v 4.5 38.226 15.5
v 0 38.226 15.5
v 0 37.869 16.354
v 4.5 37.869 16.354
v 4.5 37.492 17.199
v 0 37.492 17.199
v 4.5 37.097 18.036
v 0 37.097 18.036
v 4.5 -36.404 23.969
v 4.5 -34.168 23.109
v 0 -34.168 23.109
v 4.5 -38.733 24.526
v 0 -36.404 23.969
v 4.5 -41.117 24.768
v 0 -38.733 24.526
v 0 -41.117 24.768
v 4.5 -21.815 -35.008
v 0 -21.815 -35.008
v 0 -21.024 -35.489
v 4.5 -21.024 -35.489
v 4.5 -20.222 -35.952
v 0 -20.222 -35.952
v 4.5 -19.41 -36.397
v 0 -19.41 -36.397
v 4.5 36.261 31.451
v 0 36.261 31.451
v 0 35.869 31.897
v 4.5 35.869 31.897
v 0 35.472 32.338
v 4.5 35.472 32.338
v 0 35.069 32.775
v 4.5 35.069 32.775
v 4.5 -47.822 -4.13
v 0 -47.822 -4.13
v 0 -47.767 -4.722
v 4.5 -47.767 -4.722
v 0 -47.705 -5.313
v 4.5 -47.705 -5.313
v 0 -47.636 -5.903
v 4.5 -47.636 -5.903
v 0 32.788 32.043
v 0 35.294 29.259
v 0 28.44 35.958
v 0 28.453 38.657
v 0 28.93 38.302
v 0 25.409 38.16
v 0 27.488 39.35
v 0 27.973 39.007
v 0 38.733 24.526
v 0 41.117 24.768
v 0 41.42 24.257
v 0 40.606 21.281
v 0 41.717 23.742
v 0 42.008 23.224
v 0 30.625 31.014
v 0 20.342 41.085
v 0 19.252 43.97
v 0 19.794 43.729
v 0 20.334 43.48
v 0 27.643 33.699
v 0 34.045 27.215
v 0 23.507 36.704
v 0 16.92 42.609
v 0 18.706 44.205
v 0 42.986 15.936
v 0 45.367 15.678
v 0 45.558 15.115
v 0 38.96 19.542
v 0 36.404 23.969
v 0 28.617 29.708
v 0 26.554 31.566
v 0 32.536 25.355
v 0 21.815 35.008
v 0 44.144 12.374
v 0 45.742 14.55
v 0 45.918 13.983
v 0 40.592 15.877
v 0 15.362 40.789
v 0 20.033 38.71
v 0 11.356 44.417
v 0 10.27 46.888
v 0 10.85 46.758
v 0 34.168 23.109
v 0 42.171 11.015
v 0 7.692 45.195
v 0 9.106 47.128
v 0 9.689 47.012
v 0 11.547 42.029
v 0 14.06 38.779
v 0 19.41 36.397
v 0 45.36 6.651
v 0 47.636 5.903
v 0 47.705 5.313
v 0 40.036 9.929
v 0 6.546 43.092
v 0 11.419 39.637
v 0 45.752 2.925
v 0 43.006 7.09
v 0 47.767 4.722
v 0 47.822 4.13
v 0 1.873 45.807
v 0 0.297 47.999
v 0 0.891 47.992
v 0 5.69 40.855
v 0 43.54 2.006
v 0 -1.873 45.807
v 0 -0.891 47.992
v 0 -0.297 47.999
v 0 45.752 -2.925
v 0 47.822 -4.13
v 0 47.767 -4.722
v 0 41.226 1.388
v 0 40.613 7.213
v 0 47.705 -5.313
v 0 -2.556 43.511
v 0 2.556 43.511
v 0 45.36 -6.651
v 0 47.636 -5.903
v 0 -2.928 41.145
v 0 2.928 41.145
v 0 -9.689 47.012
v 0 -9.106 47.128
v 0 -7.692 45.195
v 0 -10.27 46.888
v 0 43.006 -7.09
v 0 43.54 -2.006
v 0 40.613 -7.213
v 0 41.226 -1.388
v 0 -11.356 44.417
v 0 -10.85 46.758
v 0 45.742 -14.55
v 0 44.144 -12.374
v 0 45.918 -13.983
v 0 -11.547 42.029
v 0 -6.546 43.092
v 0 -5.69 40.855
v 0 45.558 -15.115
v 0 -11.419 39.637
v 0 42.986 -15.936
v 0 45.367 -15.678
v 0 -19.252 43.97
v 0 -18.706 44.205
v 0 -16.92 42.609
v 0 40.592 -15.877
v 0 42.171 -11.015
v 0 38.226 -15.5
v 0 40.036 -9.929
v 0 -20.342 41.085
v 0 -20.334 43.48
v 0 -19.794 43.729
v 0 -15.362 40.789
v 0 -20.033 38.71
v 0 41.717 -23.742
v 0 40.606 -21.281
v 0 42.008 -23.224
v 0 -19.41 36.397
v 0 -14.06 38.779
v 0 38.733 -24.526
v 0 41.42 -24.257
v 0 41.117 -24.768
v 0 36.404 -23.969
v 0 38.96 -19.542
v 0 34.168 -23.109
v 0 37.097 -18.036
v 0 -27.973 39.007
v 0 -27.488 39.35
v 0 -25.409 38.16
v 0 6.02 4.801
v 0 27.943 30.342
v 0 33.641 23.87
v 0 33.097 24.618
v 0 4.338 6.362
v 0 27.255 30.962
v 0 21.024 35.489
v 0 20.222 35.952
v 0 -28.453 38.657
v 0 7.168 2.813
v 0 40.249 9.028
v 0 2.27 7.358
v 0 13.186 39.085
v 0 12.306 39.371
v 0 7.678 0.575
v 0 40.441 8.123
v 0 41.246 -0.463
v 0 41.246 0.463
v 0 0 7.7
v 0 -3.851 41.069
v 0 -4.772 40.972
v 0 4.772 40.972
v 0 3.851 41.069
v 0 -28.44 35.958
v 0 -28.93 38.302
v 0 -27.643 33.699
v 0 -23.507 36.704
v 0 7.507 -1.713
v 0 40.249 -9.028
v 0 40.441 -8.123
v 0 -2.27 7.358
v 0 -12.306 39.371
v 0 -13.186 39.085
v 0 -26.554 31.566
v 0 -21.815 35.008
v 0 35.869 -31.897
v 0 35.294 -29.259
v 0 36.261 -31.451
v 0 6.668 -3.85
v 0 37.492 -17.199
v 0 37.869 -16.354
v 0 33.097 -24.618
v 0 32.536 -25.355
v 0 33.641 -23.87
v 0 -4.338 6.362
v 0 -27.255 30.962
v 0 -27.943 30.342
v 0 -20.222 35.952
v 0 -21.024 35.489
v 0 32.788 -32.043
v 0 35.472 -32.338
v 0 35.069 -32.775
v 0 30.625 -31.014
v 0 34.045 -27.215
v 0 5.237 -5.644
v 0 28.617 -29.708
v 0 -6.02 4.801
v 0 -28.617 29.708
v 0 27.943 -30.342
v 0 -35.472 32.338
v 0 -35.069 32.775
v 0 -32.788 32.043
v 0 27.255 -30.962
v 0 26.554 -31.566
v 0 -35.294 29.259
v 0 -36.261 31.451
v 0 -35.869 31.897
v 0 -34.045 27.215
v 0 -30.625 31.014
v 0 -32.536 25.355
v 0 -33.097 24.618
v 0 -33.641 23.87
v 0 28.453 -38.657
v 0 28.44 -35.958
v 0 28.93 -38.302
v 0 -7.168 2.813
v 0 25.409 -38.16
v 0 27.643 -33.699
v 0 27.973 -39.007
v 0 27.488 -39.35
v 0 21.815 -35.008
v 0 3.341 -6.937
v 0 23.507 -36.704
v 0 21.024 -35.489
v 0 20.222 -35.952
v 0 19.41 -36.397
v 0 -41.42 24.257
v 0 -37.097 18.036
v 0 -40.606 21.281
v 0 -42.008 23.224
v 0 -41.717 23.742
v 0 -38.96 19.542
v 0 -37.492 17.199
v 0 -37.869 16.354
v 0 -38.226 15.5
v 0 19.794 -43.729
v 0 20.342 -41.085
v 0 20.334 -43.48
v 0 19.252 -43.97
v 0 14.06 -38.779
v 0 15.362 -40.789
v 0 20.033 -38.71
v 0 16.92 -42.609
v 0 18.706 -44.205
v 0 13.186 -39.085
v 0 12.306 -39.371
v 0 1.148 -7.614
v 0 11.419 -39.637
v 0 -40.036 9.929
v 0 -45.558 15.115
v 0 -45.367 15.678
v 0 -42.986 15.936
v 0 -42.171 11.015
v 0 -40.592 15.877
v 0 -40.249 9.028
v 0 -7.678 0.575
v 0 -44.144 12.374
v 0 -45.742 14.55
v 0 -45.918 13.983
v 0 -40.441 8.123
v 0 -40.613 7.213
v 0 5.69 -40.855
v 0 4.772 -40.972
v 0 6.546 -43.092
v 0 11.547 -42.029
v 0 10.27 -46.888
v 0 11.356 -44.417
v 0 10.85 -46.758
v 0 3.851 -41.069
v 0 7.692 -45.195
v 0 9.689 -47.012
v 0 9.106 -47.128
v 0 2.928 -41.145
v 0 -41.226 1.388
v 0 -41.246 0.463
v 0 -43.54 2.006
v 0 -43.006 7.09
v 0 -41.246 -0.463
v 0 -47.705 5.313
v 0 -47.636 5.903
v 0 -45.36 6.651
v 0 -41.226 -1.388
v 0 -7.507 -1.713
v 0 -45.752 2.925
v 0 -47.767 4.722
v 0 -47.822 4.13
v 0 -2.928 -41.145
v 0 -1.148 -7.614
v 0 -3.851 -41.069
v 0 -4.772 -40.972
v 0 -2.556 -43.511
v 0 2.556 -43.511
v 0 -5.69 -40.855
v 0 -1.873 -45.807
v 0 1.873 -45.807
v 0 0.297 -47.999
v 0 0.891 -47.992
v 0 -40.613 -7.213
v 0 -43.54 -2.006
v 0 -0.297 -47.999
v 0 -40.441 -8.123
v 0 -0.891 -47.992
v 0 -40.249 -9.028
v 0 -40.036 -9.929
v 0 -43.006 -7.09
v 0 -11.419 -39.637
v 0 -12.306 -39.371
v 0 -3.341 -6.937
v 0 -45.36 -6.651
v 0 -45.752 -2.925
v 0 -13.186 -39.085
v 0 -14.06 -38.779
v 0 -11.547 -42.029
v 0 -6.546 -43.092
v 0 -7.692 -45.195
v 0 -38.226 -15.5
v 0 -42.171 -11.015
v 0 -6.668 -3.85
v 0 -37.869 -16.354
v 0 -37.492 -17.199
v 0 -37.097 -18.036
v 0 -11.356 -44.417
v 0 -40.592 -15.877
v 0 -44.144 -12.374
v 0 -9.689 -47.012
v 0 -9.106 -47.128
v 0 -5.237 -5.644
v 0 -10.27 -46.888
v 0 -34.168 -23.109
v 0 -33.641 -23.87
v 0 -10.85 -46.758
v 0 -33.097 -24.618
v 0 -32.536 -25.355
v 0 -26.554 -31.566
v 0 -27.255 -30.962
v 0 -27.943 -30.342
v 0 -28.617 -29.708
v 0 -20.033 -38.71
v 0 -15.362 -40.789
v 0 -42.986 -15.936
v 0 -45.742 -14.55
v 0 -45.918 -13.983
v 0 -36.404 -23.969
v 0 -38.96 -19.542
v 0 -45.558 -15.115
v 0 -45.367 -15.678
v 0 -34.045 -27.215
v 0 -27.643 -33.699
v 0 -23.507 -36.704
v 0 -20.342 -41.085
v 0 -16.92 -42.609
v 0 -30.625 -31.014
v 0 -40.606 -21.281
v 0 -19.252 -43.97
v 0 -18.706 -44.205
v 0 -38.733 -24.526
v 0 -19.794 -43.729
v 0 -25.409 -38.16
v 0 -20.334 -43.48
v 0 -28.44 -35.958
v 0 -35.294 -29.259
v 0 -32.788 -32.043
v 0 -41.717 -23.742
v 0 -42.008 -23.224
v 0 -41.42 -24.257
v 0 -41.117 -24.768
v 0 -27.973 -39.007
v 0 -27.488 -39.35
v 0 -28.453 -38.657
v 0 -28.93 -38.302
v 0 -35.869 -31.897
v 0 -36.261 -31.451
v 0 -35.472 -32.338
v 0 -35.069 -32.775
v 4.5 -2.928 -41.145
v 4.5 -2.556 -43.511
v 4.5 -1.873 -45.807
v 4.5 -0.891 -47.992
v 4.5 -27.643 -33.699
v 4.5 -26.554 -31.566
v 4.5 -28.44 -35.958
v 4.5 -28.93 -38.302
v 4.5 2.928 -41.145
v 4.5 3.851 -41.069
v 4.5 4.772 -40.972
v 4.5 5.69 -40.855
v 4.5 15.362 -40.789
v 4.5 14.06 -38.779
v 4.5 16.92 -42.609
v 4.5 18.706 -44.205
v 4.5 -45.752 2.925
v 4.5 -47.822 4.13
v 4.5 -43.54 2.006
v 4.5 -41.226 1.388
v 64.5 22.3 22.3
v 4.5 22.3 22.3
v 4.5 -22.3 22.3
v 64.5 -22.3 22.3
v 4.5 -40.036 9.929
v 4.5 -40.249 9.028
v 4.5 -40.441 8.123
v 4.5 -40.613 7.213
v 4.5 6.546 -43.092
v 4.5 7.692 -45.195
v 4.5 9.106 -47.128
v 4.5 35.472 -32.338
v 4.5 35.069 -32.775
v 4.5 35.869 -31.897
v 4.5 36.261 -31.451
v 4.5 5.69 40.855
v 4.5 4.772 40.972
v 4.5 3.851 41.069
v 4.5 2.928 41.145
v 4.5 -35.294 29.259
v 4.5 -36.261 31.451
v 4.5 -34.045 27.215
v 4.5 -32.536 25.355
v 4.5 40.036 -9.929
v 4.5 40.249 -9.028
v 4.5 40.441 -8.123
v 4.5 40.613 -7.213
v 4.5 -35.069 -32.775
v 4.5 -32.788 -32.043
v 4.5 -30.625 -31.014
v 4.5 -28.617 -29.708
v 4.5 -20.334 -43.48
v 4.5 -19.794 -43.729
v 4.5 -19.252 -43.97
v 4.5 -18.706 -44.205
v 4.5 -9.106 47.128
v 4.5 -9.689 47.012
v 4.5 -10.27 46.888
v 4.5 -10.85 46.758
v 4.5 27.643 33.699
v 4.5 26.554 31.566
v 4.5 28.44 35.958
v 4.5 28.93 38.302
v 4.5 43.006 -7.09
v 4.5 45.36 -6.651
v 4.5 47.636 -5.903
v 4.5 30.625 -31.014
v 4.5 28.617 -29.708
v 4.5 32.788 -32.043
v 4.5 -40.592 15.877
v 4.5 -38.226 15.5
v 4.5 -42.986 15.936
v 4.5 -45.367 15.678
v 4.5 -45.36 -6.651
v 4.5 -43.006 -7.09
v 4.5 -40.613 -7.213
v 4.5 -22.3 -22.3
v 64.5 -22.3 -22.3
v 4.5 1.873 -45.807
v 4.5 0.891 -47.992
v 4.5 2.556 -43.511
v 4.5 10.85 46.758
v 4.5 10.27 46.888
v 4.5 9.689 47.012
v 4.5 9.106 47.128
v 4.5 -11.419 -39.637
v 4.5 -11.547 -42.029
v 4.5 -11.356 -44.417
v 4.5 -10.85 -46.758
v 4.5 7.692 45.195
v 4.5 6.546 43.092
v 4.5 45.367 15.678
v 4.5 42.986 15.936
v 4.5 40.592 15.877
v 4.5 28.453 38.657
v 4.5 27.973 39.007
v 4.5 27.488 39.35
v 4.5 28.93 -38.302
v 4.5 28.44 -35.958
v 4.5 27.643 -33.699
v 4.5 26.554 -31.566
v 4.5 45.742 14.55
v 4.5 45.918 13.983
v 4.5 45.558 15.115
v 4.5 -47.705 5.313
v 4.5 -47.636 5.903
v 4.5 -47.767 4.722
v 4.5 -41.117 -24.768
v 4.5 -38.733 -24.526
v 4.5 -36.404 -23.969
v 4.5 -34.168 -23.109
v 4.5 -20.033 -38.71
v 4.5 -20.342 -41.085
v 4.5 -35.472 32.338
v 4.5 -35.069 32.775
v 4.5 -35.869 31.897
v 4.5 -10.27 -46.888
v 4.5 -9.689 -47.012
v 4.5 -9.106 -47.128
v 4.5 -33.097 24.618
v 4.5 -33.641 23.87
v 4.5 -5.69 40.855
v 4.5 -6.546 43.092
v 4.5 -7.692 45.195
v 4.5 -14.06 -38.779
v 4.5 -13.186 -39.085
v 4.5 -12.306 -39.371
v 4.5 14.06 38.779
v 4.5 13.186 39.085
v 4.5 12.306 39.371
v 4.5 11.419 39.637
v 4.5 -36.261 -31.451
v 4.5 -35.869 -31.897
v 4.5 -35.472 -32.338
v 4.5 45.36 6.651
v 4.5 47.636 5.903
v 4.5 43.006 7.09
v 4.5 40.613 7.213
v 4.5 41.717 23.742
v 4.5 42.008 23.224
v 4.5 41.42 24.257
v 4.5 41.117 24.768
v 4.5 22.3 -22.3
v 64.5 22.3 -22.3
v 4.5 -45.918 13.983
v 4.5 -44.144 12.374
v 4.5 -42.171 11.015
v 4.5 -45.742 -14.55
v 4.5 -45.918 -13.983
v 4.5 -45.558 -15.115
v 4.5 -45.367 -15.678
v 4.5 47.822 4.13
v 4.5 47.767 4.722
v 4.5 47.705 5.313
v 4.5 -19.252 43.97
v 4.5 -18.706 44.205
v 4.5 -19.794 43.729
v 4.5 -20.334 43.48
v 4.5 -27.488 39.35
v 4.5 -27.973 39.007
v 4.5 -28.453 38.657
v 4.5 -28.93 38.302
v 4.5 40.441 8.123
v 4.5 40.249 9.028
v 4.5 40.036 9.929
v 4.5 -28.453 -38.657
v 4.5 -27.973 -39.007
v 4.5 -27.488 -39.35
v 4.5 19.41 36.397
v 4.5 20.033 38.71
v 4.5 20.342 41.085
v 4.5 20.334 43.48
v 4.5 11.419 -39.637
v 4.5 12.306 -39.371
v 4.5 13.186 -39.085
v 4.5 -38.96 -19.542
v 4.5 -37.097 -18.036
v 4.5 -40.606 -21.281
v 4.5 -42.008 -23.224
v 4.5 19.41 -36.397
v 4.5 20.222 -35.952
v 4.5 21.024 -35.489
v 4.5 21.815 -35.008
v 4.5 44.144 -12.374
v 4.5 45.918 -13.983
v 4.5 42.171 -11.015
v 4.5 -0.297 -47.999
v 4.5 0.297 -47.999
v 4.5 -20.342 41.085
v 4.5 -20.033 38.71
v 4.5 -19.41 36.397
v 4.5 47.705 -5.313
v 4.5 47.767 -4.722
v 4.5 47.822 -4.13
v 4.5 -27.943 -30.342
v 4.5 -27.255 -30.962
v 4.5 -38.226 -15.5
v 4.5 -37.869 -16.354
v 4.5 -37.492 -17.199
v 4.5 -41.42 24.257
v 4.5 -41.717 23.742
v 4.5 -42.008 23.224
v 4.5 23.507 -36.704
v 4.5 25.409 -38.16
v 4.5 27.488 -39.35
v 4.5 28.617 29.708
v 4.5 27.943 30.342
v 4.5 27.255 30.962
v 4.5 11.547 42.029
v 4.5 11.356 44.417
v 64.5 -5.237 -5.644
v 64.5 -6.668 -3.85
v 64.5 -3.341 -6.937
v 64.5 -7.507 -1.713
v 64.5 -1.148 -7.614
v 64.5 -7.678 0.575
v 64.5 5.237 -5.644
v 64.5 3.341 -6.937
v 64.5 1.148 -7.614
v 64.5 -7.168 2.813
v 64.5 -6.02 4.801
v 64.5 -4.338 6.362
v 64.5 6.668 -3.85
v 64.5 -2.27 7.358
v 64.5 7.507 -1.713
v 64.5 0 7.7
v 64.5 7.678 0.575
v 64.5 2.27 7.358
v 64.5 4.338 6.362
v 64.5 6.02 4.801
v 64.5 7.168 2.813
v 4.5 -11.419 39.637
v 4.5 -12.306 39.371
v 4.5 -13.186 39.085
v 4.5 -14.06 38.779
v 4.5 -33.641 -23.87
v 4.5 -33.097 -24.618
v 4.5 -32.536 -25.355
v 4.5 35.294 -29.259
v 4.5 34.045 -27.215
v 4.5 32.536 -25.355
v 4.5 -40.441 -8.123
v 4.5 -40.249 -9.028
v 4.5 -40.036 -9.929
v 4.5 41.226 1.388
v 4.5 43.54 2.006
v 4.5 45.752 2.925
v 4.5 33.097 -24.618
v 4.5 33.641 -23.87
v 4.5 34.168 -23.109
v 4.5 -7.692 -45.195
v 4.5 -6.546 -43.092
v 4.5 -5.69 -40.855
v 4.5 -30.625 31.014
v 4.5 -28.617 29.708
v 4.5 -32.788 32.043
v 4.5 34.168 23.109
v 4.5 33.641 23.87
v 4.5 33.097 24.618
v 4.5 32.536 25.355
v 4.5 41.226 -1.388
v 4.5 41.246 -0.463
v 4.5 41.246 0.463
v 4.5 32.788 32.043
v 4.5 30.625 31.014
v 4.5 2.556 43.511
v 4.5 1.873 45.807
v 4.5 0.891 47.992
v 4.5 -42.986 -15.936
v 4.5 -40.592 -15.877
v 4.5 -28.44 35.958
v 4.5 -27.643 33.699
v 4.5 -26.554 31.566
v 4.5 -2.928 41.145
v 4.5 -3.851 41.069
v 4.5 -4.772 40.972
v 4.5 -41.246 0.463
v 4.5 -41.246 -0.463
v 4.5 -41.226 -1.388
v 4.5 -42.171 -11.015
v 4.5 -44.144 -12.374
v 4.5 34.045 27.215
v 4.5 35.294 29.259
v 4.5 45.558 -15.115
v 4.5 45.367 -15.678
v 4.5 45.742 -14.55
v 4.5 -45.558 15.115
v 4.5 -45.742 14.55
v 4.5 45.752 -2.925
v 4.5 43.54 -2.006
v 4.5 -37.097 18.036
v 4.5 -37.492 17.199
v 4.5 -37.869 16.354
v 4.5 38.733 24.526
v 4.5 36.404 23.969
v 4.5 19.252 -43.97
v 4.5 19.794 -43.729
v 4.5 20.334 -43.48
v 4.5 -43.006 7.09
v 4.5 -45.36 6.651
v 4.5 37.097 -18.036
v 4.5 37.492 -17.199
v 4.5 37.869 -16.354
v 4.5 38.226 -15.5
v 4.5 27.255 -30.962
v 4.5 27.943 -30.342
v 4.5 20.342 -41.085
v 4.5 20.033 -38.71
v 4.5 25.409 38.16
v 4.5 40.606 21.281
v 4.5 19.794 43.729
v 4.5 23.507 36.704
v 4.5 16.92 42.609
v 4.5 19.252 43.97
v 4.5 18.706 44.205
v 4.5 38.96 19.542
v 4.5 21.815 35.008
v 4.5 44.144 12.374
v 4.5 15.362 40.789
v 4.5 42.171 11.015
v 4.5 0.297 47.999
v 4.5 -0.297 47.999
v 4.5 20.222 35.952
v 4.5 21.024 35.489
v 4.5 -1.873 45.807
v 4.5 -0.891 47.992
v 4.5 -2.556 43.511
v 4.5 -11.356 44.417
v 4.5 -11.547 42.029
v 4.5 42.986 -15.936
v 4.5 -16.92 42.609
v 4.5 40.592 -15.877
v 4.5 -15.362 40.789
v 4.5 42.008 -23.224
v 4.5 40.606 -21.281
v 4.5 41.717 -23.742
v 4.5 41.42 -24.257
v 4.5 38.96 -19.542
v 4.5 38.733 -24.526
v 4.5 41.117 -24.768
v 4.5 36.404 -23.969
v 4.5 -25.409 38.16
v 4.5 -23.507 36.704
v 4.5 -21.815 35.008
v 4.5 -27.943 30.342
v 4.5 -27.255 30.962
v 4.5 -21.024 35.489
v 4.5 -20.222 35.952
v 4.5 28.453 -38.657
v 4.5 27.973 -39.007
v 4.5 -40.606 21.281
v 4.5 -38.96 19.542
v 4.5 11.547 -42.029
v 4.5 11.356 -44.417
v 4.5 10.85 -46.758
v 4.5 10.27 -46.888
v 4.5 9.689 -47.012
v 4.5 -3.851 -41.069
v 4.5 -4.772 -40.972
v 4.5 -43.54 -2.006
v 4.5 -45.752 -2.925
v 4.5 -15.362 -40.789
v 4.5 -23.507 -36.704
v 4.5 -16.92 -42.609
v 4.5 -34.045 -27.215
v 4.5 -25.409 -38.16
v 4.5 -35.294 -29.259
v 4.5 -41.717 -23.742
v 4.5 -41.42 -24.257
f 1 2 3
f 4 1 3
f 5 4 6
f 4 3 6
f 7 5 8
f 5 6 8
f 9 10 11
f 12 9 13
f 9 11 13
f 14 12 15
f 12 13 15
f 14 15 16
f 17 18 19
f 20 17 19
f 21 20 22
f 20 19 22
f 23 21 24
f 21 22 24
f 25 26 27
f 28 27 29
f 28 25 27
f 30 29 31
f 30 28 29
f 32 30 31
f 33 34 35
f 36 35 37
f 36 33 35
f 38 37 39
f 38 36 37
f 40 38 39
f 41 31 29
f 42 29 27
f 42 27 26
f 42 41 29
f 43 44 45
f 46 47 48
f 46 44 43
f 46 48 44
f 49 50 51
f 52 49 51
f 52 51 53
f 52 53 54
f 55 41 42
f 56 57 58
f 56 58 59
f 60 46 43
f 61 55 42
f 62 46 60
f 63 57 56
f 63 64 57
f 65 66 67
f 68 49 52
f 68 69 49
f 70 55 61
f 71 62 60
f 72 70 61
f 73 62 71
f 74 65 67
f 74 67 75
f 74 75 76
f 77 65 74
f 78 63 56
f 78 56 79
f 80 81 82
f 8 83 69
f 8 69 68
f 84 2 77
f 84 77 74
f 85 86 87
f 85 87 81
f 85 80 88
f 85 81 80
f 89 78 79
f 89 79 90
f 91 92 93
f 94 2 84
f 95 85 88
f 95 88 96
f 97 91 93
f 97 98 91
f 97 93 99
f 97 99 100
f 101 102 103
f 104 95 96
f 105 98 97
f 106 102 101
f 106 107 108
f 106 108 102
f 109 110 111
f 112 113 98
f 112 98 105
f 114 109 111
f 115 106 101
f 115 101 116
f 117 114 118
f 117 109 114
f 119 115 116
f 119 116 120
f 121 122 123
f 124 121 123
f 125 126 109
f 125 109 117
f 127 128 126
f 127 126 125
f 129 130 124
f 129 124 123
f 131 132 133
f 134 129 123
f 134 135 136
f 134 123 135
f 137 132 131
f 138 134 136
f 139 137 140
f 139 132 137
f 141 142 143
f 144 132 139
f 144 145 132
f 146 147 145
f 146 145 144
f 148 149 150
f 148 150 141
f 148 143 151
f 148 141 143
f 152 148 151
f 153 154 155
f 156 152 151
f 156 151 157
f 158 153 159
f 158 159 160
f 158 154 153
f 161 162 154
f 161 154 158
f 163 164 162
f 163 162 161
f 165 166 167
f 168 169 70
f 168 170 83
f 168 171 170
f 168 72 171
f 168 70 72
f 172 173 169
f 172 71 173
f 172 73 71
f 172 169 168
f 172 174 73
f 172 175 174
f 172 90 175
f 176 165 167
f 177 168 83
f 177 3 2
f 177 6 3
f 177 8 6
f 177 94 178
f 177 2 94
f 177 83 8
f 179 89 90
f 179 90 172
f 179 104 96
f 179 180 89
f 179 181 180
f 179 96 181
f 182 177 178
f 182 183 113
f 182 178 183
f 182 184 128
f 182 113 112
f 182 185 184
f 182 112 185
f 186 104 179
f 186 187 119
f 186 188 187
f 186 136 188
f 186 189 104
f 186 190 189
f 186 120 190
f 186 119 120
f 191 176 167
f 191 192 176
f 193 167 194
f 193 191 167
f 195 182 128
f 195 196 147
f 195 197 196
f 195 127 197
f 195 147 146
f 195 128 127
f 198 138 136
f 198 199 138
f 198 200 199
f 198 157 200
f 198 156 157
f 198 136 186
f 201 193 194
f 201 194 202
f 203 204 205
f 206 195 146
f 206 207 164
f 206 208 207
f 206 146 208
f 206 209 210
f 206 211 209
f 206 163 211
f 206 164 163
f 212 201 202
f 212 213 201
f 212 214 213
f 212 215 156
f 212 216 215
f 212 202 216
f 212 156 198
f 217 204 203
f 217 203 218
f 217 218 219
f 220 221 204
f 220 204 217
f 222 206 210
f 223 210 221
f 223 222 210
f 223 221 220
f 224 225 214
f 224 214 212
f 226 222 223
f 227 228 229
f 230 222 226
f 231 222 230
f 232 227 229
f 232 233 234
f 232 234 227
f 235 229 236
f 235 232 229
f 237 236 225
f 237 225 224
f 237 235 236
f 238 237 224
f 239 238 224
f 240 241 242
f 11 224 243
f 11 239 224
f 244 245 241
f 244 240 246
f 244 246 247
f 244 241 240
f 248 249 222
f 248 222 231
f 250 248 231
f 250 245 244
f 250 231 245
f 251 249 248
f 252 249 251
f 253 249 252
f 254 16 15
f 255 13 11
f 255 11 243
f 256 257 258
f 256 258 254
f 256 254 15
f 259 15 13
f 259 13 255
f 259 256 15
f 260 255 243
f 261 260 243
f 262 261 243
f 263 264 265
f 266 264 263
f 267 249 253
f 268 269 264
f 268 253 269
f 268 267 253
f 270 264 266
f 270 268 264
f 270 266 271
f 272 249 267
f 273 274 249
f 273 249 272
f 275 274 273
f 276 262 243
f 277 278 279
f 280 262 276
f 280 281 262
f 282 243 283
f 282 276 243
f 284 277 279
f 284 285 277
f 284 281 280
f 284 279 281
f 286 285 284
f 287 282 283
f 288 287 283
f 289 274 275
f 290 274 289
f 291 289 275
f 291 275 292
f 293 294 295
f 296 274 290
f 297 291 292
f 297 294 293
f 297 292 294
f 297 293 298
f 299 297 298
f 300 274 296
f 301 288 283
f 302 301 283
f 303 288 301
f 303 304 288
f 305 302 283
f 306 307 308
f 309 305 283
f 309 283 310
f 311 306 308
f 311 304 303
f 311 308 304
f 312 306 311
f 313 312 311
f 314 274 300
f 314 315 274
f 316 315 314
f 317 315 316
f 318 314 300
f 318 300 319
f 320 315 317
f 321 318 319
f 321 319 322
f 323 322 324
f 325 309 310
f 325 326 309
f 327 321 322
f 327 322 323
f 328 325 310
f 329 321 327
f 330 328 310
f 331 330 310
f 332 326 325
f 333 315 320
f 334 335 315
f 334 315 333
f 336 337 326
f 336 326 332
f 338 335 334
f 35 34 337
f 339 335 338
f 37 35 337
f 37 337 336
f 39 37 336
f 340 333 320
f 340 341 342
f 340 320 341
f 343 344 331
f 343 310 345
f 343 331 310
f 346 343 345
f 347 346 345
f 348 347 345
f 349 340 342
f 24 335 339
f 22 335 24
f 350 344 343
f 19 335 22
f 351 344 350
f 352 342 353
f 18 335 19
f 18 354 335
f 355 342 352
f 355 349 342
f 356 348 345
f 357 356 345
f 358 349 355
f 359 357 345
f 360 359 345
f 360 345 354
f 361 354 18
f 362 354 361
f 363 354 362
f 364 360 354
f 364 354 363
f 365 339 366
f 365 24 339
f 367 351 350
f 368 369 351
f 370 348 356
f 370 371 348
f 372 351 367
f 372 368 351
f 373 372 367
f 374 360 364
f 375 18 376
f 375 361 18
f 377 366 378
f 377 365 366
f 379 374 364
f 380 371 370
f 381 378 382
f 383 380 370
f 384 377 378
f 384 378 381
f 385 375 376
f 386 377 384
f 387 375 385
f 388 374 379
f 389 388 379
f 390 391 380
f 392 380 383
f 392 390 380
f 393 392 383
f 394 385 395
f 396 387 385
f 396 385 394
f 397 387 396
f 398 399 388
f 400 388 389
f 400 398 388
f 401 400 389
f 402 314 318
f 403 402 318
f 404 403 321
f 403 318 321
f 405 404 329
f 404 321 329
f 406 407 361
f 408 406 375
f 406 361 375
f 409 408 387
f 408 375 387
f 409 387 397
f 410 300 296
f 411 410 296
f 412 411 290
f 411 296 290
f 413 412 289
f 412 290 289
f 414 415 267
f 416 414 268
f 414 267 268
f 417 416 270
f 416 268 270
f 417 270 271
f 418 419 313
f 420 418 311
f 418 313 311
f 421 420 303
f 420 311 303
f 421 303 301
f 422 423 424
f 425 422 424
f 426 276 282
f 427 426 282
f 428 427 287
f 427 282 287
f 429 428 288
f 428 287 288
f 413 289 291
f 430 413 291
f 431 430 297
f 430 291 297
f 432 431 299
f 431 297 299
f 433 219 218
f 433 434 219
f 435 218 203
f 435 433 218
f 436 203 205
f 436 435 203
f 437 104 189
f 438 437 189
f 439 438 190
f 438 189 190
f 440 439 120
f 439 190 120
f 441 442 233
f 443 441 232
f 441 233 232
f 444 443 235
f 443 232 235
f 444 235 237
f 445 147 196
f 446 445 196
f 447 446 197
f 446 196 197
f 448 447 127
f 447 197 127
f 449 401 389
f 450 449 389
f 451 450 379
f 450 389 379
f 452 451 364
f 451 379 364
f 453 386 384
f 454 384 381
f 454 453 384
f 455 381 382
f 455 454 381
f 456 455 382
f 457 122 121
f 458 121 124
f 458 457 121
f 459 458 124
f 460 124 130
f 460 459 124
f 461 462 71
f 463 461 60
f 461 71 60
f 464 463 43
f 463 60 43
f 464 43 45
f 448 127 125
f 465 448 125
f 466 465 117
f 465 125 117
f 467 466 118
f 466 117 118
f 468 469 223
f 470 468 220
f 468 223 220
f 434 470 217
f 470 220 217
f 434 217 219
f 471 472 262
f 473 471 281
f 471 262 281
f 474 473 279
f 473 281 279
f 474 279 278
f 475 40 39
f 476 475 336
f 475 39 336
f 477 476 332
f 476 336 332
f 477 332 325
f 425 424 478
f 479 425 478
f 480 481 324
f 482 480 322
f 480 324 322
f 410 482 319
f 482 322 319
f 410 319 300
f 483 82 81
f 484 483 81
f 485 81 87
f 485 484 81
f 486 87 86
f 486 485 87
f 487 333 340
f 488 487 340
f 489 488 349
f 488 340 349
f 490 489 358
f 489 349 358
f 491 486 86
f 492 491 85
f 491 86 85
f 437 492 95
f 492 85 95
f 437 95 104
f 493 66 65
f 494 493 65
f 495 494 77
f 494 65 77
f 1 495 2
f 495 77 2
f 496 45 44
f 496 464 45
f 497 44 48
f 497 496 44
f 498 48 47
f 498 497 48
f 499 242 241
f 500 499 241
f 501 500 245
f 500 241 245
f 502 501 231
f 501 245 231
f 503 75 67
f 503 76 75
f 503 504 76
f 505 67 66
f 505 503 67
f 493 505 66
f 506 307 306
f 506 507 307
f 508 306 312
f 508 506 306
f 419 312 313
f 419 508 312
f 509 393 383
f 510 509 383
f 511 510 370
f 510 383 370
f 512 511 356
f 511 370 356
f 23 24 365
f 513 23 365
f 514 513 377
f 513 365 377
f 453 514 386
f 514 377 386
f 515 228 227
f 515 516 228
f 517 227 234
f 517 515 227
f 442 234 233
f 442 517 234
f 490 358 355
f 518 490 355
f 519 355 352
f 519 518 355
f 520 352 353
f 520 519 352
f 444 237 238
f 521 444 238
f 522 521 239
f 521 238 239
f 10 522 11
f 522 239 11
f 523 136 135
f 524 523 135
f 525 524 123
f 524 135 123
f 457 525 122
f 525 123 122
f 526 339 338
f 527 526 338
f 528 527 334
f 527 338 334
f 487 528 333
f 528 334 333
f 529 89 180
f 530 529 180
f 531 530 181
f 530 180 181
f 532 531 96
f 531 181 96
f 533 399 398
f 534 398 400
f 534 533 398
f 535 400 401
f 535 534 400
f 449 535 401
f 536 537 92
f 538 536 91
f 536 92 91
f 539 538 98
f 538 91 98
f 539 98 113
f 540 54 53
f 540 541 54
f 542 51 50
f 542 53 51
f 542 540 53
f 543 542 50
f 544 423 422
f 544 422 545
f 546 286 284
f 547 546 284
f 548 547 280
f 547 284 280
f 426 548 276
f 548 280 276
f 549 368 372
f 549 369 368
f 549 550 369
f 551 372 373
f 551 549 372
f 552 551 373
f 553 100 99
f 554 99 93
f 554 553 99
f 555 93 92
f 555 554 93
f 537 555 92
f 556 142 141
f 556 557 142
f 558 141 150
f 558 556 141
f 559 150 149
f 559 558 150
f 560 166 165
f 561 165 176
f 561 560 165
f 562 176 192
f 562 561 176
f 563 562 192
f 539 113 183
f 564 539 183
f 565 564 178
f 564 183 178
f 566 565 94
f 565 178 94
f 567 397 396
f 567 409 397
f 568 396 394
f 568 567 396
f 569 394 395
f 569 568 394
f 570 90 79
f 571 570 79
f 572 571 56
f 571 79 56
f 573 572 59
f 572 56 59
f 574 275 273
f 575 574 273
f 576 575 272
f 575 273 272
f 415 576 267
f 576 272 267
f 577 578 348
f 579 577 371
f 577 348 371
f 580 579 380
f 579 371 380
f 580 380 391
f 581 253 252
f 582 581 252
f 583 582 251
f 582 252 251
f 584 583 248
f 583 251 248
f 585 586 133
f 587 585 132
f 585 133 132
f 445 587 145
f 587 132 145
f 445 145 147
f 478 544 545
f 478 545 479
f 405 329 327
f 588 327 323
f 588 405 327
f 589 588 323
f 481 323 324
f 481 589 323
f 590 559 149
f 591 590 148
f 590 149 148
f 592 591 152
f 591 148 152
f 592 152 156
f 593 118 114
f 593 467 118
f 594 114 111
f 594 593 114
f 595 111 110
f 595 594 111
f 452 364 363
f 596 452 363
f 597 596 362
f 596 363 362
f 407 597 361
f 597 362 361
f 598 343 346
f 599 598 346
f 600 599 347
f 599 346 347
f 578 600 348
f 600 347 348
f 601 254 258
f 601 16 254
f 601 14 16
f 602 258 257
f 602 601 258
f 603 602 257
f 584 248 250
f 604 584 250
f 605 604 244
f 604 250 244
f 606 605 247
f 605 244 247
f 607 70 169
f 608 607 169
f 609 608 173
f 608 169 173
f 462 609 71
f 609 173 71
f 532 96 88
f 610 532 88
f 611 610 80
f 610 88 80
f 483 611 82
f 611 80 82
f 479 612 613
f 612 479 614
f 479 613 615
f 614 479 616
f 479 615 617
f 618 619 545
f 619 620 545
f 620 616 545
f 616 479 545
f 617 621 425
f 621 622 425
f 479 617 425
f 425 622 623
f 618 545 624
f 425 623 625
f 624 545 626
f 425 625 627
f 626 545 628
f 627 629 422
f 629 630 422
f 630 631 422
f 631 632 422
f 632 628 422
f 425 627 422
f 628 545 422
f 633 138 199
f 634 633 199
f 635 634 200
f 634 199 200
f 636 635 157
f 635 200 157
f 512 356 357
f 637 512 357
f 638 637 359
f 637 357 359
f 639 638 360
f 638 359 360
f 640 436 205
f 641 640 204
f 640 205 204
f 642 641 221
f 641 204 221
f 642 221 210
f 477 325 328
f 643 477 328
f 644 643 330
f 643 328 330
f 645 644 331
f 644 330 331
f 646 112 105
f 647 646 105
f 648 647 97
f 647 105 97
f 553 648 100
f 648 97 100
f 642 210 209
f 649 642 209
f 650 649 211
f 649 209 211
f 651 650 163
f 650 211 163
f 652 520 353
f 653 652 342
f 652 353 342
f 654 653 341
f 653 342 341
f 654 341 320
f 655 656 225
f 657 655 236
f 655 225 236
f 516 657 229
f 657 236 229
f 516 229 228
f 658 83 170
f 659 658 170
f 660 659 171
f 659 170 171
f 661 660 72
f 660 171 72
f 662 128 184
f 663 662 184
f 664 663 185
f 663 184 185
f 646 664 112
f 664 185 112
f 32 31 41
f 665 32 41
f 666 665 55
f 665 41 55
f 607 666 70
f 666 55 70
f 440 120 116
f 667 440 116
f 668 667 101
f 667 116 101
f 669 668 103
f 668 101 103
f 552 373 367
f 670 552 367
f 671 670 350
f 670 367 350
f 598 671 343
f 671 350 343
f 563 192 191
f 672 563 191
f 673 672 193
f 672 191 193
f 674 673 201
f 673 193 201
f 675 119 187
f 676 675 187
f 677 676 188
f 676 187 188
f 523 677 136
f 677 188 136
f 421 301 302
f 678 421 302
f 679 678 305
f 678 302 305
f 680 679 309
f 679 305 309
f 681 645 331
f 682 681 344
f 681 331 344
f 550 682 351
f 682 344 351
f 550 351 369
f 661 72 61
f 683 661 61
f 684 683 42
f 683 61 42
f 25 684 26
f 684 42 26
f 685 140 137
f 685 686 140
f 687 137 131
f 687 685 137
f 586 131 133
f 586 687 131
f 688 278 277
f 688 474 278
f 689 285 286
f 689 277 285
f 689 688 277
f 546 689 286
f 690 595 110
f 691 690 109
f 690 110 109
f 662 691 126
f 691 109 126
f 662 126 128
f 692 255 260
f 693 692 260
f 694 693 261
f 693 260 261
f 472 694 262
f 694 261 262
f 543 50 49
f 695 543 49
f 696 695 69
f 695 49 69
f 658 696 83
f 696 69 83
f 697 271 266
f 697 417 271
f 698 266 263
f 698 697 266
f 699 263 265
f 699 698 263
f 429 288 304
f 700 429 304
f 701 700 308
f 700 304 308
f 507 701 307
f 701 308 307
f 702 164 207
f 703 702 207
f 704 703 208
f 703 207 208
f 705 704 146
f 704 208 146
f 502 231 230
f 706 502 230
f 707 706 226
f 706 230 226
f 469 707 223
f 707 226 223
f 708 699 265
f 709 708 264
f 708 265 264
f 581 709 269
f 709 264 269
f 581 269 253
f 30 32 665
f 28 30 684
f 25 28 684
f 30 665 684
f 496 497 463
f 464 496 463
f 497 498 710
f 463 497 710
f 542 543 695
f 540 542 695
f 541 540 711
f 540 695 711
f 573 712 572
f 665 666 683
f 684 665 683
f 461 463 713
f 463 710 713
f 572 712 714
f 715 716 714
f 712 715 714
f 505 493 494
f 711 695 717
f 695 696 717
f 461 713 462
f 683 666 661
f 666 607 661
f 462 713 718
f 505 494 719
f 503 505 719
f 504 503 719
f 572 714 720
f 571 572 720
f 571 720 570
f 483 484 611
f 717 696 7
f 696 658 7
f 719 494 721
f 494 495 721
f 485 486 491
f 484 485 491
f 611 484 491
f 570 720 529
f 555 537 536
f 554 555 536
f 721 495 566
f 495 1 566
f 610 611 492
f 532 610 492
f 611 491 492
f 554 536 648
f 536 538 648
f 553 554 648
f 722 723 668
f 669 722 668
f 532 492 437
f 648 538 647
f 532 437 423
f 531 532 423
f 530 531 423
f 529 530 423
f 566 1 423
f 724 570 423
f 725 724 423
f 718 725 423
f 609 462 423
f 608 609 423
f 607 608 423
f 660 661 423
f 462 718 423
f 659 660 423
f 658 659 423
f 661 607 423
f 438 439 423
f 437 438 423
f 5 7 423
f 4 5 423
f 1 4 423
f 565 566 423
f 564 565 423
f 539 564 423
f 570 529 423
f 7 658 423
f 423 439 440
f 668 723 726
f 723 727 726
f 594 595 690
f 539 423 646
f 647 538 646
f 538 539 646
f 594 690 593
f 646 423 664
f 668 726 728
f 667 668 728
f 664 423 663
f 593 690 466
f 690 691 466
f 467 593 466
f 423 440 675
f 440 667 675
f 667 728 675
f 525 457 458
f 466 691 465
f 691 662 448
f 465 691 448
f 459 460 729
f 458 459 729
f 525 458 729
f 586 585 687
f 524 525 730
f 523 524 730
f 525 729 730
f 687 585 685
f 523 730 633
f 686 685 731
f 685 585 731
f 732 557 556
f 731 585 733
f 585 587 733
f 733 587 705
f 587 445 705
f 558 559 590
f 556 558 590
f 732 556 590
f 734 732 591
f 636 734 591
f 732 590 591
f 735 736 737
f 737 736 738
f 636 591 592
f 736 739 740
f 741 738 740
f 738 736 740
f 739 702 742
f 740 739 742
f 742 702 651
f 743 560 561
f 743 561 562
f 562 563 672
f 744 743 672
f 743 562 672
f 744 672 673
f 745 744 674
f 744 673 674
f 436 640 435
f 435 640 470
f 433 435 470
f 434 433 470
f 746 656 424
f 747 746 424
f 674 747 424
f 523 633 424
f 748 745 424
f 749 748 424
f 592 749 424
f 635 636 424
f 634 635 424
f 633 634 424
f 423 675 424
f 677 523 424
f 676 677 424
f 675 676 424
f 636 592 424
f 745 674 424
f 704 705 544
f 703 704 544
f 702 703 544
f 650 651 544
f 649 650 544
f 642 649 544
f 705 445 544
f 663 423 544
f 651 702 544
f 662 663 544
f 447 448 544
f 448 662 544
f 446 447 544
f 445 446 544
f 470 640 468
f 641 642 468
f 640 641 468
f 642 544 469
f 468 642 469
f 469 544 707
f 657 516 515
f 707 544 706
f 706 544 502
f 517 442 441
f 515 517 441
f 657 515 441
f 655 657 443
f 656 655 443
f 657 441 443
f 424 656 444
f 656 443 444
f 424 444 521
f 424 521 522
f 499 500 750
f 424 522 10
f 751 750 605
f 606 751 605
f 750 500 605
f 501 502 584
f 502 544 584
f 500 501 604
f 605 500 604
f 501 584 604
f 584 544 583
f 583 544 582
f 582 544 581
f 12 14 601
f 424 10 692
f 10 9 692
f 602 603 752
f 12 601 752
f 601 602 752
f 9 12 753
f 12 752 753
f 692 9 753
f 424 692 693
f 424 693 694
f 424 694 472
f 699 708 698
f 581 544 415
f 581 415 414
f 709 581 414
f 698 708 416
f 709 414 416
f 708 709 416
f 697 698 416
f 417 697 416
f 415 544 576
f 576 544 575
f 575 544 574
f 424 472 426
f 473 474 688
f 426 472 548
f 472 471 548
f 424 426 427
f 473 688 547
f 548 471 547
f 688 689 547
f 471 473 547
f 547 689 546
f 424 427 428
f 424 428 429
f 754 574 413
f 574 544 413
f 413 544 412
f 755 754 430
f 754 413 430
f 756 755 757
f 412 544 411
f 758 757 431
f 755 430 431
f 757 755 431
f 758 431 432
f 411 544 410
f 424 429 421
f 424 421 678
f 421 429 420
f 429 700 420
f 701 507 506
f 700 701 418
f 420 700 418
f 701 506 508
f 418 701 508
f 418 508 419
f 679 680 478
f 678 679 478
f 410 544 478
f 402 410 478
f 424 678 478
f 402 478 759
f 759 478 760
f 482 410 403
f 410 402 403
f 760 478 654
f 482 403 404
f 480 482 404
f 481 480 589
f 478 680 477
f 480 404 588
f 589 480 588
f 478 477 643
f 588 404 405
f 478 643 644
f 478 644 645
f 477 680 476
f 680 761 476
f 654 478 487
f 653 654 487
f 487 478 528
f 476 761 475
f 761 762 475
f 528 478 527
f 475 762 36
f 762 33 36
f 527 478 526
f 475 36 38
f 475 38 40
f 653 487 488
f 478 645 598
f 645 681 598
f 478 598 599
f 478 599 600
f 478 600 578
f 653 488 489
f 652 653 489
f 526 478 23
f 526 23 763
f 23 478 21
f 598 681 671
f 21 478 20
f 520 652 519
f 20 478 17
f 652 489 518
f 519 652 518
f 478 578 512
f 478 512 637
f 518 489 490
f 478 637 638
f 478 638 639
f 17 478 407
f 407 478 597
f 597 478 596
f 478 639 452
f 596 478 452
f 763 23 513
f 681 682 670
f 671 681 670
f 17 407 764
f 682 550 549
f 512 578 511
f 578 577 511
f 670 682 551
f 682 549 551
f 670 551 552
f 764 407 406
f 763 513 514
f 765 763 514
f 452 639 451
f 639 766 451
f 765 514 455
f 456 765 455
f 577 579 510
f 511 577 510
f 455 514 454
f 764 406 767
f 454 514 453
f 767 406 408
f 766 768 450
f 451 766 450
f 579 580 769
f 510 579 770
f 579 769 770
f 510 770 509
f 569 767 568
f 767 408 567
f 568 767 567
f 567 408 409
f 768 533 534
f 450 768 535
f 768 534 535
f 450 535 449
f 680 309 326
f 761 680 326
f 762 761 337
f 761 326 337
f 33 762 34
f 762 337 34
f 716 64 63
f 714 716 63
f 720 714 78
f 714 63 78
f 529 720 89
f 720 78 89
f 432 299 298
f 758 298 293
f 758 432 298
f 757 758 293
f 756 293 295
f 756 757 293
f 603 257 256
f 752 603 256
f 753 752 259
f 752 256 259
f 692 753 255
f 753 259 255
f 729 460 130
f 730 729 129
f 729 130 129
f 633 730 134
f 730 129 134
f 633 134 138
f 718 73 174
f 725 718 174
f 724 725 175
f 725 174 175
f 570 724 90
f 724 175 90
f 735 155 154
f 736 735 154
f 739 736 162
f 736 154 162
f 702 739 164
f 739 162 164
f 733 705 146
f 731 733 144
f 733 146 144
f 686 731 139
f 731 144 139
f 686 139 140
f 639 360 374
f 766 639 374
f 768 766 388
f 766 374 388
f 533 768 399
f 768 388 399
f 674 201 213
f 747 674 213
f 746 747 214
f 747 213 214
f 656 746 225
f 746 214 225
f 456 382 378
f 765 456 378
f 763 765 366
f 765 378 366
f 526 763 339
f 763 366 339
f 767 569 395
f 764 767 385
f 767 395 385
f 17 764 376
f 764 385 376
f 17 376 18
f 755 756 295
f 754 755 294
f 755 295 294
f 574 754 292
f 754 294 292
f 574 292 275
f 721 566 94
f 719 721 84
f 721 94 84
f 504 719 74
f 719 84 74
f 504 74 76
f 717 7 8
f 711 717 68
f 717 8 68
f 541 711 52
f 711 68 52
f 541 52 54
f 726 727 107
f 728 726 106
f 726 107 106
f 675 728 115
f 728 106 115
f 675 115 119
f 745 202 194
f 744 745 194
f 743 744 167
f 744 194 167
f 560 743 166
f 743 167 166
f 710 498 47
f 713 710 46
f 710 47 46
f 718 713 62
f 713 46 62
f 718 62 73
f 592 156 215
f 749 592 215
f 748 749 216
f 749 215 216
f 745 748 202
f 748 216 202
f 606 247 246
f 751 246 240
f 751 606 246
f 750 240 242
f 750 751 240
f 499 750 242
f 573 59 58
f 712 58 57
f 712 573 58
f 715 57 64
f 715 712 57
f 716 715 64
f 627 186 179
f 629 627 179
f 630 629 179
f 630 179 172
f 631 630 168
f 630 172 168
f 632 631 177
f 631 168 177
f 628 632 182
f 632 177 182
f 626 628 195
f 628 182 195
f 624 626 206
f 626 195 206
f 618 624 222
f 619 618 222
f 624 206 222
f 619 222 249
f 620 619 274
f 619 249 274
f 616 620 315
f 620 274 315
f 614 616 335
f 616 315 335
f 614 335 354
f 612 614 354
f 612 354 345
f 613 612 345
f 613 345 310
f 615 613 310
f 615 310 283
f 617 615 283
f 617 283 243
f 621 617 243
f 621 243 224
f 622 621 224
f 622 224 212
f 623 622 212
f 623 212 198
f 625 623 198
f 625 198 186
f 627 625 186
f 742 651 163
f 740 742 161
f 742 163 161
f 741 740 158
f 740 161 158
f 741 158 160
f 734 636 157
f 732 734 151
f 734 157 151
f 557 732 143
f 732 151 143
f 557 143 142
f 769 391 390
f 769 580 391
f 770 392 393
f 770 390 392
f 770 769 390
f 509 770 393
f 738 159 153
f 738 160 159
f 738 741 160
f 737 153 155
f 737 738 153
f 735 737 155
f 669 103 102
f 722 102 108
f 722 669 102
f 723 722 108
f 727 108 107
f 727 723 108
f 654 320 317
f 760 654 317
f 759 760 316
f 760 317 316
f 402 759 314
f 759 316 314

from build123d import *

# Parameters (mm, degrees)
BASPROSKE_W         = 4.5
BASPROSKE_H         = 48
TOOTHCUT_DEPTH      = 69.031242823
TEETHCUTS_COUNT     = 30
TEETHCUTS_ANGLE     = 348
BORSKE_R            = 5
BORE_DEPTH          = 50.0000508
BOSS_EXTRUDE2_DEPTH = 60
SKETCH6_R           = 7.7
CUT_EXTRUDE2_DEPTH  = 94.547796729


with BuildPart() as part:
    # BasProSke → Base-Revolve (revolve)
    with BuildSketch(Plane(origin=(0, 0, 0), x_dir=(1, 0, 0), z_dir=(0, 1, 0)), mode=Mode.PRIVATE) as base_revolve_sk:
        with Locations((2.25, 24)):
            Rectangle(BASPROSKE_W, BASPROSKE_H)
    revolve(base_revolve_sk.sketch.rotate(Axis((-10, 0, 0), (1, 0, 0)), 180), axis=Axis((-10, 0, 0), (1, 0, 0)))

    # TooCutSke → ToothCut (cut, through all)
    with BuildSketch(Plane(origin=(0, 0, 0), x_dir=(0, 0, -1), z_dir=(1, 0, 0))):
        with BuildLine():
            ThreePointArc((1.388358102, 41.225628713), (0, 41.249), (-1.388358102, 41.225628713))
            ThreePointArc((-1.388358102, 41.225628713), (-2.434419088, 44.674608087), (-4.146627223, 47.846050285))
            ThreePointArc((-4.146627223, 47.846050285), (0, 48.0254), (4.146627223, 47.846050285))
            ThreePointArc((4.146627223, 47.846050285), (2.434419088, 44.674608087), (1.388358102, 41.225628713))
        make_face()
    toothcut = extrude(amount=TOOTHCUT_DEPTH, mode=Mode.SUBTRACT)

    # TeethCuts: ToothCut ×30 about axis
    teethcuts_axis = Axis((-10, 0, 0), (1, 0, 0))
    for i in range(1, TEETHCUTS_COUNT):
        add(toothcut.rotate(teethcuts_axis, i * TEETHCUTS_ANGLE / (TEETHCUTS_COUNT - 1)), mode=Mode.SUBTRACT)

    # BorSke → Bore (cut, symmetric)
    with BuildSketch(Plane(origin=(0, 0, 0), x_dir=(0, 0, -1), z_dir=(1, 0, 0))):
        with Locations(Location((0, 0, 0), (0, 0, 180))):
            Circle(BORSKE_R)
    extrude(amount=BORE_DEPTH, both=True, mode=Mode.SUBTRACT)

    # Sketch5 → Boss-Extrude2 (add)
    with BuildSketch(Plane(origin=(4.5, 0, 0), x_dir=(0, 0, -1), z_dir=(1, 0, 0))):
        Polygon((22.3, 22.3), (22.3, -22.3), (-22.3, 22.3), align=None)
        Polygon((-22.3, 22.3), (-22.3, -22.3), (22.3, -22.3), align=None)
    extrude(amount=BOSS_EXTRUDE2_DEPTH)

    # Sketch6 → Cut-Extrude2 (cut, through all)
    with BuildSketch(Plane.ZY):
        Circle(SKETCH6_R)
    extrude(amount=-CUT_EXTRUDE2_DEPTH, mode=Mode.SUBTRACT)


solid = part.part
